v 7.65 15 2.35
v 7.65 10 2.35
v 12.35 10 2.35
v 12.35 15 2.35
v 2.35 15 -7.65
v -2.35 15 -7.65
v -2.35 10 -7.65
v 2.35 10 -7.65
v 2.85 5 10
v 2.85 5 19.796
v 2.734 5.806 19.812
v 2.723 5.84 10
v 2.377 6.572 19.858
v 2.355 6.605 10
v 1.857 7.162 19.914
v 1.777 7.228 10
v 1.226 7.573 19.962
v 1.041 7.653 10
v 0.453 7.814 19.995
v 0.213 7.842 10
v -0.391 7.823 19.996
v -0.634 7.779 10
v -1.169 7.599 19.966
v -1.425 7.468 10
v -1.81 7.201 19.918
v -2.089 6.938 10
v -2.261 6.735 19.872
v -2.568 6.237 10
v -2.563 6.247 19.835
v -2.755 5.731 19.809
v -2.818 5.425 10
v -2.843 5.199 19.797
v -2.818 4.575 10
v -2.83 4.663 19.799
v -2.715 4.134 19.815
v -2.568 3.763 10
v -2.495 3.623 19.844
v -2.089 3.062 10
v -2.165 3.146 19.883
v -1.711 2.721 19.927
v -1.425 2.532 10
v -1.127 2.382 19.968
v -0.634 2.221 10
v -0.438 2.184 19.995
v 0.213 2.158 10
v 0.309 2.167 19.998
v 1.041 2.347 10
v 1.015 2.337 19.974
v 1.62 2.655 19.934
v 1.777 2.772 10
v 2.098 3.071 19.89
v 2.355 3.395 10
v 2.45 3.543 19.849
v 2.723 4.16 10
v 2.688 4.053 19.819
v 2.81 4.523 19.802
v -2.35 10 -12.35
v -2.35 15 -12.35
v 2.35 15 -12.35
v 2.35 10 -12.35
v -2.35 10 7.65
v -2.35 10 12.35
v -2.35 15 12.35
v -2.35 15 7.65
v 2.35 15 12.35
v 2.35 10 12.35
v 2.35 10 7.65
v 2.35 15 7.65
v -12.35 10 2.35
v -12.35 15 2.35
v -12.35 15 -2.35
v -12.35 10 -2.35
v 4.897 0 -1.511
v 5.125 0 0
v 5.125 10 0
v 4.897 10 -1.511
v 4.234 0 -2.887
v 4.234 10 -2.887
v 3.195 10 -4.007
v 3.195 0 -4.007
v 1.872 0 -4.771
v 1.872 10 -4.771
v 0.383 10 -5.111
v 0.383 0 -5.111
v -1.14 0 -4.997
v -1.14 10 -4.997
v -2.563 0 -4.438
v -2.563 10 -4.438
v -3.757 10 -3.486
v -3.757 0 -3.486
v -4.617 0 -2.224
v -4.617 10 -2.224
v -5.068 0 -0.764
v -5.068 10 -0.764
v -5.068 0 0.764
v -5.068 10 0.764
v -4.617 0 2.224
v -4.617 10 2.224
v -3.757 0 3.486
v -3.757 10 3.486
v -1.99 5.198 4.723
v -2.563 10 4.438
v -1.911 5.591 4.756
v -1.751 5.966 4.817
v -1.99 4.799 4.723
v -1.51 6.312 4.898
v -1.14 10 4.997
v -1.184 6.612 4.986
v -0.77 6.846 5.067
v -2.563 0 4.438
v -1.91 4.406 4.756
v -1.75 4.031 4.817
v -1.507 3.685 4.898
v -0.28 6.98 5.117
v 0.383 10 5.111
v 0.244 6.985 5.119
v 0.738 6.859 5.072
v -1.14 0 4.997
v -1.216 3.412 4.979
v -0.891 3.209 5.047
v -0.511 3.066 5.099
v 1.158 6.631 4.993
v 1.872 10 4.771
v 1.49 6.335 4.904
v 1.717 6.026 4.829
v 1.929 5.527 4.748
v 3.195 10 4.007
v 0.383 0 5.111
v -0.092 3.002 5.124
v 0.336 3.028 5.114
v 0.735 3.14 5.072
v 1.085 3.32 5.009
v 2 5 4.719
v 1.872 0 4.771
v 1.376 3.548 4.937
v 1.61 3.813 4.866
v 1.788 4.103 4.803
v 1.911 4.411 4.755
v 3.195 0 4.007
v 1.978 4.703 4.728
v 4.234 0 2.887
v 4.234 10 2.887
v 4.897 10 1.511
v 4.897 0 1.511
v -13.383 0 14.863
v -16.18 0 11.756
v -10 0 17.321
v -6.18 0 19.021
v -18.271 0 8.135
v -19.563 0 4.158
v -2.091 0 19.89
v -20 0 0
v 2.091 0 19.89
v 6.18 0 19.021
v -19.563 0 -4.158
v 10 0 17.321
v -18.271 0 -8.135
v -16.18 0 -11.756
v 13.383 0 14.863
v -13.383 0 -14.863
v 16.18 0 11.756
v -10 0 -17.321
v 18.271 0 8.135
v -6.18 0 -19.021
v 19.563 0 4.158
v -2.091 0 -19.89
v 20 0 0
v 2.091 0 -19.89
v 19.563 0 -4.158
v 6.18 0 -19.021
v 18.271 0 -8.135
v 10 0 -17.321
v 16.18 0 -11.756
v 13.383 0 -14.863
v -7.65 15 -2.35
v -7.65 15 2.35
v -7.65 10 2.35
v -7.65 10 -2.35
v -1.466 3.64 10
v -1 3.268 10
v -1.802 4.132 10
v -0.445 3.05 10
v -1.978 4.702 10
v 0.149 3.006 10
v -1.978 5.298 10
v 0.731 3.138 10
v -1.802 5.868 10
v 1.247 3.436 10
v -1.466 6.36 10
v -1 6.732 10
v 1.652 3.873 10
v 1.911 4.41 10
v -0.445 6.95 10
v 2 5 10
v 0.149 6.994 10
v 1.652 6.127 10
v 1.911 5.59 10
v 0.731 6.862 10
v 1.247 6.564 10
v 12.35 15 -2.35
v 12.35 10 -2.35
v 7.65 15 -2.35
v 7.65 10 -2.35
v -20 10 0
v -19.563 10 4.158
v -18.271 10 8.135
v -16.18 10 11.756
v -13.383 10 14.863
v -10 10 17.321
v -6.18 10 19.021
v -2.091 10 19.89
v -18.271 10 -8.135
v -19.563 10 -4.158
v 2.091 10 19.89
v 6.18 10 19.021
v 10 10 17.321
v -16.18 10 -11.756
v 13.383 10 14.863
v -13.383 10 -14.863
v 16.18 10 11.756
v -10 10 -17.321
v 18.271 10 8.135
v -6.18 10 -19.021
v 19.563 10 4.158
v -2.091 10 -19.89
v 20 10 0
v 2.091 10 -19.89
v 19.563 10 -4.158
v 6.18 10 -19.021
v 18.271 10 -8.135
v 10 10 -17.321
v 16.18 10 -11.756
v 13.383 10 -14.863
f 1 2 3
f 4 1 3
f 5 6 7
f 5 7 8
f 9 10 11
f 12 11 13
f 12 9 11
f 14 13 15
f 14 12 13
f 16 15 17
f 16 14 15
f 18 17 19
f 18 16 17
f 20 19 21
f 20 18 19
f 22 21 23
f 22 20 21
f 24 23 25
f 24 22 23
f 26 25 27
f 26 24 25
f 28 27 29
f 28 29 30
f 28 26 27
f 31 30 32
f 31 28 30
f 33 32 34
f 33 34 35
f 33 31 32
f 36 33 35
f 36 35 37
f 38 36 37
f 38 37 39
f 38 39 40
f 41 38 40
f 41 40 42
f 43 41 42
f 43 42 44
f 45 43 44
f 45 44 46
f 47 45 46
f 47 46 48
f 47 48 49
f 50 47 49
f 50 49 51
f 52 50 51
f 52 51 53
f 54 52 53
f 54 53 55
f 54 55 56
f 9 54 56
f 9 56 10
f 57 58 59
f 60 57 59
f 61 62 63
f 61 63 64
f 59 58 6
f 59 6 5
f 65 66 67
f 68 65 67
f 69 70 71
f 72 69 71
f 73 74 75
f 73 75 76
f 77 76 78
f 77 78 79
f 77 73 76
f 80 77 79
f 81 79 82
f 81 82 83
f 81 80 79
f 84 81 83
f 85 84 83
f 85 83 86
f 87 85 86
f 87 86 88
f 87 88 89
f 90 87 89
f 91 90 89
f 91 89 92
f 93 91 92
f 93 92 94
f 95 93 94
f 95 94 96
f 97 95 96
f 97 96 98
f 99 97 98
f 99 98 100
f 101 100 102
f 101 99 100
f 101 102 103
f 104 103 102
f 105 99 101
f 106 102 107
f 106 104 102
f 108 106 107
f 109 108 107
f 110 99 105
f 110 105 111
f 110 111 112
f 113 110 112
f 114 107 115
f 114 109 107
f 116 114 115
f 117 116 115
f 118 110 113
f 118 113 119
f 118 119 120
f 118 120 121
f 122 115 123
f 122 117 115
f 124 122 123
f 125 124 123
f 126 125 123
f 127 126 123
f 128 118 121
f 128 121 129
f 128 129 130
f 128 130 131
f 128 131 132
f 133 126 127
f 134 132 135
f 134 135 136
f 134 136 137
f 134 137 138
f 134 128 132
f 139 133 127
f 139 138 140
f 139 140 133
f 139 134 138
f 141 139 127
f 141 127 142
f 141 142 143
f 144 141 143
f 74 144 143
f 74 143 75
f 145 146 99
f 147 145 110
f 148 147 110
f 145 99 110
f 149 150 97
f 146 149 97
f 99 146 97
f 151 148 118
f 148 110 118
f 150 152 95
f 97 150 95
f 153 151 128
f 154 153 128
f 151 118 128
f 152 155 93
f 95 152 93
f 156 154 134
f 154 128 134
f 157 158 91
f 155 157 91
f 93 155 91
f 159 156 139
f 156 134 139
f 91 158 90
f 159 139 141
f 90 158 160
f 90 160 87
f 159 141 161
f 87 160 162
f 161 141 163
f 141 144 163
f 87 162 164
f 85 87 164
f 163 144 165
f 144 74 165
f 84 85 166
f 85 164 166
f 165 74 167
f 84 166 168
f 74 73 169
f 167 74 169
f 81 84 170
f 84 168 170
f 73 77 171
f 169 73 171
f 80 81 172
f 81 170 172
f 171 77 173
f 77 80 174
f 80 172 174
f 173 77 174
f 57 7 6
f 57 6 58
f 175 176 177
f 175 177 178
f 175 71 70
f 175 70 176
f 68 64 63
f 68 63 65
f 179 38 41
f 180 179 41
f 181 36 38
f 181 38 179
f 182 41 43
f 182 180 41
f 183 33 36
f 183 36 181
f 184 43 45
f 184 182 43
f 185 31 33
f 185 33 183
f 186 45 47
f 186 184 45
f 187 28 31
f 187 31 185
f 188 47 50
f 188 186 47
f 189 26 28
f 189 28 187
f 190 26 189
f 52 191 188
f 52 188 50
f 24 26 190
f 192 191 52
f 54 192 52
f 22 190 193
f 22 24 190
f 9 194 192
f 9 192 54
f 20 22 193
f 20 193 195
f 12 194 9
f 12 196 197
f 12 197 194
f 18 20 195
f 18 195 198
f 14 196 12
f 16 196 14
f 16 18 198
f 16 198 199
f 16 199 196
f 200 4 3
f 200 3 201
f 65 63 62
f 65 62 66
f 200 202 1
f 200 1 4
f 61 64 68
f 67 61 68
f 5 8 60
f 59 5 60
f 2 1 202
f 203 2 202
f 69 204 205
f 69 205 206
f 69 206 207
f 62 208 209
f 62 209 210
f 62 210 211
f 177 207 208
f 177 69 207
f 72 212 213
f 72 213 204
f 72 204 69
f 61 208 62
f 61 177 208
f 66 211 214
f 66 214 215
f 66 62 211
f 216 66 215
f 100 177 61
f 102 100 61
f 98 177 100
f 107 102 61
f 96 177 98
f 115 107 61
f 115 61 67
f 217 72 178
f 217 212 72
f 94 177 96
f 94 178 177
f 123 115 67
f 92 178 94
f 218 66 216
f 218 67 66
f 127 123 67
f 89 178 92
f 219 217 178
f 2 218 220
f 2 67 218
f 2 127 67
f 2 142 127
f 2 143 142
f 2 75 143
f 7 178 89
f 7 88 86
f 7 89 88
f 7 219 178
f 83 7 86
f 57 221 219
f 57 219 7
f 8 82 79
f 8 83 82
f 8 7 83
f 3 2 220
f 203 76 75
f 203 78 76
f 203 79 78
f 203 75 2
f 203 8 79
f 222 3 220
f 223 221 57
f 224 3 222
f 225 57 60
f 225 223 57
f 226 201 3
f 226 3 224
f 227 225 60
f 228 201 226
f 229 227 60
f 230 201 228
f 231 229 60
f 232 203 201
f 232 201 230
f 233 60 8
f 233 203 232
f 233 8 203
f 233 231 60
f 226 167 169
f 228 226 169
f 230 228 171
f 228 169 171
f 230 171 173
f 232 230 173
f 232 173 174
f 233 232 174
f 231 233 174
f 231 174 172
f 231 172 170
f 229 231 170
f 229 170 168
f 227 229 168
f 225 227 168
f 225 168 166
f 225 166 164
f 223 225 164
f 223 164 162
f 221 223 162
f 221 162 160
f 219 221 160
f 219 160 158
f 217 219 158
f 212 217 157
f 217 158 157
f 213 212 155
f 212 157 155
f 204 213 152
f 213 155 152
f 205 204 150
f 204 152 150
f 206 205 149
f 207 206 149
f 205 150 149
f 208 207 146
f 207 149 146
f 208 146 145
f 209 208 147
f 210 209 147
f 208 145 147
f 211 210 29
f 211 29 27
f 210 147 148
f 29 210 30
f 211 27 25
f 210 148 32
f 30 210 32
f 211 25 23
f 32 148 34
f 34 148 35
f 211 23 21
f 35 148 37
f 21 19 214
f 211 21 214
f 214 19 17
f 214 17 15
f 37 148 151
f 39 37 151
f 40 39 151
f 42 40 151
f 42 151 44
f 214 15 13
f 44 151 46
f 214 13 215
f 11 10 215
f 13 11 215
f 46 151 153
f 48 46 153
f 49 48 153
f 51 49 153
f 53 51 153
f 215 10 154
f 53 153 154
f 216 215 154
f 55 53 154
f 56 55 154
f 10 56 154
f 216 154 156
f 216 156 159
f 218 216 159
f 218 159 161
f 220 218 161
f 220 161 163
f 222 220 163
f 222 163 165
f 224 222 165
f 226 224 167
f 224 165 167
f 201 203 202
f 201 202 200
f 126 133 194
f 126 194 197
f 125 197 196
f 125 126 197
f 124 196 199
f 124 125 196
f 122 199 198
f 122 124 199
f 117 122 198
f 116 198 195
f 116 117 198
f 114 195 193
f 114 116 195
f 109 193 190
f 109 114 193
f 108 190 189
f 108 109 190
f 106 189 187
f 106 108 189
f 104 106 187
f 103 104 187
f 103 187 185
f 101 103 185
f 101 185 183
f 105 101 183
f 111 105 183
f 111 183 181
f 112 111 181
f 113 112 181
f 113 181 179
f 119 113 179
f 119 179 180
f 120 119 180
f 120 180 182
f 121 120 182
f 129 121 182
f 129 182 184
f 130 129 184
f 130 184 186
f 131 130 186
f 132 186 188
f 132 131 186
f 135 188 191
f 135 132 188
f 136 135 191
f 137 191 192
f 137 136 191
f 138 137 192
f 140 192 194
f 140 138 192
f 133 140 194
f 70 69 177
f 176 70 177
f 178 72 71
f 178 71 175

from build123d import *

# Parameters (mm, degrees)
SKETCH1_R           = 20
SKETCH1_R_2         = 5.125
BOSS_EXTRUDE1_DEPTH = 10
SKETCH2_W           = 4.7
SKETCH2_H           = 4.7
BOSS_EXTRUDE2_DEPTH = 5
SKETCH3_R           = 2
CUT_EXTRUDE2_DEPTH  = 21
CUT_EXTRUDE3_START  = 10
SKETCH4_R           = 2.85
CUT_EXTRUDE3_DEPTH  = 11.000000127


with BuildPart() as part:
    # Sketch1 → Boss-Extrude1 (new body)
    with BuildSketch(Plane(origin=(0, 0, 0), x_dir=(1, 0, 0), z_dir=(0, 1, 0))):
        Circle(SKETCH1_R)
        Circle(SKETCH1_R_2, mode=Mode.SUBTRACT)
    extrude(amount=BOSS_EXTRUDE1_DEPTH)

    # Sketch2 → Boss-Extrude2 (add)
    with BuildSketch(Plane(origin=(0, 10, 0), x_dir=(1, 0, 0), z_dir=(0, 1, 0))):
        with Locations((10, 0)):
            Rectangle(SKETCH2_W, SKETCH2_H)
        with Locations((0, 10)):
            Rectangle(SKETCH2_W, SKETCH2_H)
        with Locations((0, -10)):
            Rectangle(SKETCH2_W, SKETCH2_H)
        with Locations((-10, 0)):
            Rectangle(SKETCH2_W, SKETCH2_H)
    extrude(amount=BOSS_EXTRUDE2_DEPTH)

    # Sketch3 → Cut-Extrude2 (cut, through all)
    with BuildSketch(Plane.XY):
        with Locations((0, 5)):
            Circle(SKETCH3_R)
    extrude(amount=CUT_EXTRUDE2_DEPTH, mode=Mode.SUBTRACT)

    # Sketch4 → Cut-Extrude3 (cut, through all)
    with BuildSketch(Plane.XY.offset(CUT_EXTRUDE3_START)):
        with Locations((0, 5)):
            Circle(SKETCH4_R)
    extrude(amount=CUT_EXTRUDE3_DEPTH, mode=Mode.SUBTRACT)


solid = part.part
